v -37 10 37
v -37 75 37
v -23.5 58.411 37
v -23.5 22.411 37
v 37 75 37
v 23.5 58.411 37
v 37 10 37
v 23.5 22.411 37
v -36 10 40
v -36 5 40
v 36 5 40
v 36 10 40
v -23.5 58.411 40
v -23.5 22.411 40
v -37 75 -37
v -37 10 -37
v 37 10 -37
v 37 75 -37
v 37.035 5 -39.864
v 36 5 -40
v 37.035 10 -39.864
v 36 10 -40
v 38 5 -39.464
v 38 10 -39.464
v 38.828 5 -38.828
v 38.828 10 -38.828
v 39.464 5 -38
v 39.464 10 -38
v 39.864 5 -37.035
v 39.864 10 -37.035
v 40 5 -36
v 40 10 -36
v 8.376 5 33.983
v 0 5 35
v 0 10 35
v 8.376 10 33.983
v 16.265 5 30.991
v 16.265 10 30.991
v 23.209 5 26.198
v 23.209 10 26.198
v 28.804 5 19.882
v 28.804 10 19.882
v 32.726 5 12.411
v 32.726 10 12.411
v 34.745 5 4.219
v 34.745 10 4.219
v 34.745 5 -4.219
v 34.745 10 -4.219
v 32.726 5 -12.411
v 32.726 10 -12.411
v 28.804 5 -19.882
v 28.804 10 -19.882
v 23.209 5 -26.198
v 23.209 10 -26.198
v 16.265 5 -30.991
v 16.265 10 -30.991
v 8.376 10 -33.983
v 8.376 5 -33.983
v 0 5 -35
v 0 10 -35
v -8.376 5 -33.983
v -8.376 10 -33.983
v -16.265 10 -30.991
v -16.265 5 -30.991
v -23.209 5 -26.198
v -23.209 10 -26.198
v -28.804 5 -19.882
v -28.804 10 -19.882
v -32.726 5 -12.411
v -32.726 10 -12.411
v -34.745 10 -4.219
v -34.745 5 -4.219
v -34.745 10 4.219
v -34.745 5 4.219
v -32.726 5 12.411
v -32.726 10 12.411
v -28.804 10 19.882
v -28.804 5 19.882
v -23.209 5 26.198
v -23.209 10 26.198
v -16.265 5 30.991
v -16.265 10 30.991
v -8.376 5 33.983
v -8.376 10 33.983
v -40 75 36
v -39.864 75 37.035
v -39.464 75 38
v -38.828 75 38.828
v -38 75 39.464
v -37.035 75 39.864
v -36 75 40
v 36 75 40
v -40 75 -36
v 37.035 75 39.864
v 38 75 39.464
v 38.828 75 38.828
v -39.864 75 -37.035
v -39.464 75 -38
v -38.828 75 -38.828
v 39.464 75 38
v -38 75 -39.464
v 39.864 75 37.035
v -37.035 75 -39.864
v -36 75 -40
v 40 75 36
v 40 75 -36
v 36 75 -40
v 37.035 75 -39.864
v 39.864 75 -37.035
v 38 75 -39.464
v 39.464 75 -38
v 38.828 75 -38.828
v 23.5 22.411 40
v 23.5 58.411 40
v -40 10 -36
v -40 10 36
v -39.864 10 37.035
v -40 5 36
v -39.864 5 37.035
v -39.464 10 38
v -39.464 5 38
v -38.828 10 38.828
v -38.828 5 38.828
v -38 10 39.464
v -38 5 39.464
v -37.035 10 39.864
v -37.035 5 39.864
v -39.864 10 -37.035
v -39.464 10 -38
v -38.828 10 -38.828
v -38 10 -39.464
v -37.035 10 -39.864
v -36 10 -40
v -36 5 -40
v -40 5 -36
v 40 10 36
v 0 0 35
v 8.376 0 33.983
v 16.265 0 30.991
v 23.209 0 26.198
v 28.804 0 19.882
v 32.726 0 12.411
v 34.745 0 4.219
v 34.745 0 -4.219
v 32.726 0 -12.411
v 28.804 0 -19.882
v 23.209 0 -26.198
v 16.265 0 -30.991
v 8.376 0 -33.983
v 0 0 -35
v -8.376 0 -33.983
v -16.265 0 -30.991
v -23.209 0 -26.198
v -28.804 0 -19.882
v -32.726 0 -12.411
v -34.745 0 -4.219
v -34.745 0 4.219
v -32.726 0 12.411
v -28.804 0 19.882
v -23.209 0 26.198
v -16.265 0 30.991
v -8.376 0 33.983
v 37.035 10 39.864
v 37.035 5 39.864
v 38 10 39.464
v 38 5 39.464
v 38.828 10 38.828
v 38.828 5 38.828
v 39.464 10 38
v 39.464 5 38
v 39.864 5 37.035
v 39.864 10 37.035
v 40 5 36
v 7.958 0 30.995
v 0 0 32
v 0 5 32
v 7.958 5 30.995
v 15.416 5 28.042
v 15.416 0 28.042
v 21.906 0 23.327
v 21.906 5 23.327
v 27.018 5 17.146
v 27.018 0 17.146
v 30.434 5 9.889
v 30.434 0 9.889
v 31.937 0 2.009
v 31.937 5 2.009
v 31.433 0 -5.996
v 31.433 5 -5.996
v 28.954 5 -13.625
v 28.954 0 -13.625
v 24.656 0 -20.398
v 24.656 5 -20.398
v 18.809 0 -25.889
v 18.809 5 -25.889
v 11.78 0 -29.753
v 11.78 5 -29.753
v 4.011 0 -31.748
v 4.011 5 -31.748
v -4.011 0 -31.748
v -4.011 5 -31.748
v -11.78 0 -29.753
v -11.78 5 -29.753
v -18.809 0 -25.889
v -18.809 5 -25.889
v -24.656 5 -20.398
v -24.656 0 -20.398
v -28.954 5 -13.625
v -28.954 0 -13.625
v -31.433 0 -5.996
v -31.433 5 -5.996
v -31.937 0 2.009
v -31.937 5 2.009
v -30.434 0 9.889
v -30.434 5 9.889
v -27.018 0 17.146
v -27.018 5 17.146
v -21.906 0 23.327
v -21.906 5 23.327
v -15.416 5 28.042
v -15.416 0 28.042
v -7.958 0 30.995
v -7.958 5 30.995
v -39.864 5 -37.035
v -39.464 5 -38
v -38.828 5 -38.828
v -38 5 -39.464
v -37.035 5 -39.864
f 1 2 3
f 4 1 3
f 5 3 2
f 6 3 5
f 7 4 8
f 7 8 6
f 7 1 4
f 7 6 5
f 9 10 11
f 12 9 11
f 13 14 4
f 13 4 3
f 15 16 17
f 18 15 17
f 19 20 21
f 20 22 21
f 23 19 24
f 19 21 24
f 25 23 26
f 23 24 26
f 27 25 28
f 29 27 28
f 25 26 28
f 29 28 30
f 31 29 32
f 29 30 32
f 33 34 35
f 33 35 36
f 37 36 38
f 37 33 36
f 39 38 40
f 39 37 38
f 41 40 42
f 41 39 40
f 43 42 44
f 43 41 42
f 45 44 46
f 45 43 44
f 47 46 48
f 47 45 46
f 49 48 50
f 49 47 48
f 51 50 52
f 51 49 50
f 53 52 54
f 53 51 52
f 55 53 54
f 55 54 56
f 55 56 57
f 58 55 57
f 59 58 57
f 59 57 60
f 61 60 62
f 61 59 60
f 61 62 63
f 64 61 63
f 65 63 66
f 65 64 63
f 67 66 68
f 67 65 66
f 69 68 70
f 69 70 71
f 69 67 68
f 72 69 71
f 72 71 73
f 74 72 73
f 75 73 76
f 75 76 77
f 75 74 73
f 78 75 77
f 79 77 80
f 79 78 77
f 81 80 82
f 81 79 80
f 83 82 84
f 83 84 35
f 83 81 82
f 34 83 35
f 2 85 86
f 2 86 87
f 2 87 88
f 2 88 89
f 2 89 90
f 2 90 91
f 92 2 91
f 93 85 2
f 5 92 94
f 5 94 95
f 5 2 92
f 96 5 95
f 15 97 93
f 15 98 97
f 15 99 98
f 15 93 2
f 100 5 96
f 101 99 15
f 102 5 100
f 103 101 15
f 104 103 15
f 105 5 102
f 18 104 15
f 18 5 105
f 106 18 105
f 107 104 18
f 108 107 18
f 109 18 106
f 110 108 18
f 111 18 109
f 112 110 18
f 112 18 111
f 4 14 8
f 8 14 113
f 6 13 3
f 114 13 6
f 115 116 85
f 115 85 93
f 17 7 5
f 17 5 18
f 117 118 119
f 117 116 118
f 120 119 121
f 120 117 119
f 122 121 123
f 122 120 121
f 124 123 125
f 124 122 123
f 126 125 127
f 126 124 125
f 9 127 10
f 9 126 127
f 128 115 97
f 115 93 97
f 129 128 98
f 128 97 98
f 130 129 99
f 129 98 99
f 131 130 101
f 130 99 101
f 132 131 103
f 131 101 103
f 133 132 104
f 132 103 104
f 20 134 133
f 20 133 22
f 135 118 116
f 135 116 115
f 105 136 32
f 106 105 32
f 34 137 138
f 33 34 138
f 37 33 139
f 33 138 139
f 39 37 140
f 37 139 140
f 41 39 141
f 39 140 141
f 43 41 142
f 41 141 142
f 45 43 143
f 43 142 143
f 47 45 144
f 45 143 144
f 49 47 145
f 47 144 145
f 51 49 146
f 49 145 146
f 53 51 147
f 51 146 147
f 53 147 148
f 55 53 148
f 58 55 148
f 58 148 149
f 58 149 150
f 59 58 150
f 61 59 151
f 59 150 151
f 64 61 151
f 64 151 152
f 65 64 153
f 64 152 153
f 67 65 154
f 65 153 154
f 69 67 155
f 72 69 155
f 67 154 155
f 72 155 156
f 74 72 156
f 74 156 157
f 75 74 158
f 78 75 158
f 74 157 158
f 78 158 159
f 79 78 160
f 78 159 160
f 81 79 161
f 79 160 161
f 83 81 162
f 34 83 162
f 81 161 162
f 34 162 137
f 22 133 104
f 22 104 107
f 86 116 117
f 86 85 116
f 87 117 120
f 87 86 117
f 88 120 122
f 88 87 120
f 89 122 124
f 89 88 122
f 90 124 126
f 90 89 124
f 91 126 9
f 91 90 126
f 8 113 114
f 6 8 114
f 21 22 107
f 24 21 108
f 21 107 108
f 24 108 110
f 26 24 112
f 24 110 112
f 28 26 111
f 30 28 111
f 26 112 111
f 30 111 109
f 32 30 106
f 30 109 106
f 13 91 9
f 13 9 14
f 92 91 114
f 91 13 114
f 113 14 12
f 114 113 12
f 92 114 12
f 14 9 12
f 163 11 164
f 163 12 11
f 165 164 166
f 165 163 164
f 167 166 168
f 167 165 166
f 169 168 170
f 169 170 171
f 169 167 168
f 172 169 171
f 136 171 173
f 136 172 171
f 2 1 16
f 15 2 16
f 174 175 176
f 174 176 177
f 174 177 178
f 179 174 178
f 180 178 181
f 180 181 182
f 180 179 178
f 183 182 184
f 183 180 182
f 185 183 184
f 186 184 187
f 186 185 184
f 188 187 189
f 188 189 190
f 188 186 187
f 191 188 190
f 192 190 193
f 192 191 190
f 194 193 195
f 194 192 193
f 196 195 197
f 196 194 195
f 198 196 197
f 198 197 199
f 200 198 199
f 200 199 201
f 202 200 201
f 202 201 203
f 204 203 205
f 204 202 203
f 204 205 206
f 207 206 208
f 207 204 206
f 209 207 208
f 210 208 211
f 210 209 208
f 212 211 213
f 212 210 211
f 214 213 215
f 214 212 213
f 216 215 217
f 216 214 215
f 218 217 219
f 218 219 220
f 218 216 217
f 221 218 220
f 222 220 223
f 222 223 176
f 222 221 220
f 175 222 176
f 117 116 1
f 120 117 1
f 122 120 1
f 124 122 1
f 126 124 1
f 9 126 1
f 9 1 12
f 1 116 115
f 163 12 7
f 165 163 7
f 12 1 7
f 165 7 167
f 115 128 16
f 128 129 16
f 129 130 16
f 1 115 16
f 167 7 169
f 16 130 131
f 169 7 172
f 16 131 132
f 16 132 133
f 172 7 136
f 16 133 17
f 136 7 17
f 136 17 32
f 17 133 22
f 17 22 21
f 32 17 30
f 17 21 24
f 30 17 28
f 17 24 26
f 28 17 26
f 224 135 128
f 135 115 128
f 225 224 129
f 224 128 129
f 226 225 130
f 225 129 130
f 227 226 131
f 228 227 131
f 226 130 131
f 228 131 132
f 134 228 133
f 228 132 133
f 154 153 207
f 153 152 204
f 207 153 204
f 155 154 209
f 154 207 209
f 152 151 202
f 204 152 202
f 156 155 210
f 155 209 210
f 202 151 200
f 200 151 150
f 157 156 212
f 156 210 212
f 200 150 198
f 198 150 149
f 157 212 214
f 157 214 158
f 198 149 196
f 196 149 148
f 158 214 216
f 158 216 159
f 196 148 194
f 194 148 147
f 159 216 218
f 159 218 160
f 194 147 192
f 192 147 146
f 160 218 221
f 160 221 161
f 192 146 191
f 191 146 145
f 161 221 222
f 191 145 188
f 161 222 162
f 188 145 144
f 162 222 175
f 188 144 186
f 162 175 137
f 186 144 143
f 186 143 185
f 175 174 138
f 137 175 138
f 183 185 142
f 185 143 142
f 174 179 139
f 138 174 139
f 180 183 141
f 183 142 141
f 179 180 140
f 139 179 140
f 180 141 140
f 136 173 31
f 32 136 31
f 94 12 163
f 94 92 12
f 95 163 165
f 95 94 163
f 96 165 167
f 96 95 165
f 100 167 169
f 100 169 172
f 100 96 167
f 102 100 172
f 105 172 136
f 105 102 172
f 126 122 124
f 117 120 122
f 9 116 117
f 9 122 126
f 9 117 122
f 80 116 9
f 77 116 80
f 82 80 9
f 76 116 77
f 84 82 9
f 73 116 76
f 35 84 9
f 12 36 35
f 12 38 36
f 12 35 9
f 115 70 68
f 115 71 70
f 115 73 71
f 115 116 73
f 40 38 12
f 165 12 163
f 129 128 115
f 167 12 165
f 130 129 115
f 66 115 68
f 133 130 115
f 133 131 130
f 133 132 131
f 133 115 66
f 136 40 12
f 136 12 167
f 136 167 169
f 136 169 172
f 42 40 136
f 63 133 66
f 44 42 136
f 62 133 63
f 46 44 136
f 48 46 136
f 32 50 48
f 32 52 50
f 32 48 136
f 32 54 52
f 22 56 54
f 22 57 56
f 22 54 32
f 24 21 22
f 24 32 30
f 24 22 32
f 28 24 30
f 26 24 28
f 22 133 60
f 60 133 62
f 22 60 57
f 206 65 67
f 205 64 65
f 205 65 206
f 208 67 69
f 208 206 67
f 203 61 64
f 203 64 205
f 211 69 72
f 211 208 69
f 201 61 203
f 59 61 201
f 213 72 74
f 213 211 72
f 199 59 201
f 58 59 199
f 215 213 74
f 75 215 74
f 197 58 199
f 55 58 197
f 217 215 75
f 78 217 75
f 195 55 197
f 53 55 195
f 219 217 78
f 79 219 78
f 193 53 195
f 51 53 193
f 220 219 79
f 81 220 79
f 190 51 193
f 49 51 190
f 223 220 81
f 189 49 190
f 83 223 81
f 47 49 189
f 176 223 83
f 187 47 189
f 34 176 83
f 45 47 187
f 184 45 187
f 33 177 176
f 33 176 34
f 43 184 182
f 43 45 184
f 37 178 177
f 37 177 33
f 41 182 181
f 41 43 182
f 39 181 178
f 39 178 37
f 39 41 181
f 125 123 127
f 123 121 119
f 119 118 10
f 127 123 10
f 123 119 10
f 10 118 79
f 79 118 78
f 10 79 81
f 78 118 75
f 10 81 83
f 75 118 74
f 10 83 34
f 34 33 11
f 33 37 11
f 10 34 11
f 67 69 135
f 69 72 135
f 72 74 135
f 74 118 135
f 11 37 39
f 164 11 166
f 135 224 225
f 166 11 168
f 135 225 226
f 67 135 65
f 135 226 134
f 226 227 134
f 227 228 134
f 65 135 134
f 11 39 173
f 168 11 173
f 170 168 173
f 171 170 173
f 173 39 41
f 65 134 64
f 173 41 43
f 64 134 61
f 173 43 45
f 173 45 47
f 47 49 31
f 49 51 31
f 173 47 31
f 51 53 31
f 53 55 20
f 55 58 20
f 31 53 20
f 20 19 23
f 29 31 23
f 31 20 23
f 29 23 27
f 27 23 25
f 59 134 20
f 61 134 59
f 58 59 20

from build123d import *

# Parameters (mm, degrees)
SKETCH1_R           = 35
SKETCH1_R_2         = 32
BOSS_EXTRUDE1_DEPTH = 5
SKETCH2_W           = 80
SKETCH2_H           = 80
SKETCH2_R           = 35
BOSS_EXTRUDE3_DEPTH = 5
SKETCH9_W           = 80
SKETCH9_H           = 80
SKETCH9_W_2         = 74
SKETCH9_H_2         = 74
BOSS_EXTRUDE4_DEPTH = 65
SKETCH11_W          = 47
SKETCH11_H          = 36
CUT_EXTRUDE2_DEPTH  = 3
FILLET1_R           = 4
FILLET2_R           = 4


with BuildPart() as part:
    # Sketch1 → Boss-Extrude1 (new body)
    with BuildSketch(Plane(origin=(0, 0, 0), x_dir=(1, 0, 0), z_dir=(0, 1, 0))):
        with Locations(Location((0, 0, 0), (0, 0, 270))):
            Circle(SKETCH1_R)
        with Locations(Location((0, 0, 0), (0, 0, 270))):
            Circle(SKETCH1_R_2, mode=Mode.SUBTRACT)
    extrude(amount=BOSS_EXTRUDE1_DEPTH)


with BuildPart() as body_2:
    # Sketch2 → Boss-Extrude3 (new body)
    with BuildSketch(Plane(origin=(0, 5, 0), x_dir=(1, 0, 0), z_dir=(0, 1, 0))):
        Rectangle(SKETCH2_W, SKETCH2_H)
        with Locations(Location((0, 0, 0), (0, 0, 270))):
            Circle(SKETCH2_R, mode=Mode.SUBTRACT)
    extrude(amount=BOSS_EXTRUDE3_DEPTH)

    # Fillet1
    fillet1_edges = [body_2.edges().sort_by_distance(p)[0] for p in [
        (40, 7.5, 40),
        (-40, 7.5, 40),
        (-40, 7.5, -40),
        (40, 7.5, -40),
    ]]
    fillet(fillet1_edges, radius=FILLET1_R)


with BuildPart() as body_3:
    # Sketch9 → Boss-Extrude4 (new body)
    with BuildSketch(Plane(origin=(0, 10, 0), x_dir=(1, 0, 0), z_dir=(0, 1, 0))):
        Rectangle(SKETCH9_W, SKETCH9_H)
        Rectangle(SKETCH9_W_2, SKETCH9_H_2, mode=Mode.SUBTRACT)
    extrude(amount=BOSS_EXTRUDE4_DEPTH)

    # Sketch11 → Cut-Extrude2 (cut)
    with BuildSketch(Plane.XY.offset(40)):
        with Locations((0, 40.410944599)):
            Rectangle(SKETCH11_W, SKETCH11_H)
    extrude(amount=-CUT_EXTRUDE2_DEPTH, mode=Mode.SUBTRACT)

    # Fillet2
    fillet2_edges = [body_3.edges().sort_by_distance(p)[0] for p in [
        (-40, 42.5, -40),
        (40, 42.5, -40),
        (40, 42.5, 40),
        (-40, 42.5, 40),
    ]]
    fillet(fillet2_edges, radius=FILLET2_R)


solid = Compound([part.part, body_2.part, body_3.part])
